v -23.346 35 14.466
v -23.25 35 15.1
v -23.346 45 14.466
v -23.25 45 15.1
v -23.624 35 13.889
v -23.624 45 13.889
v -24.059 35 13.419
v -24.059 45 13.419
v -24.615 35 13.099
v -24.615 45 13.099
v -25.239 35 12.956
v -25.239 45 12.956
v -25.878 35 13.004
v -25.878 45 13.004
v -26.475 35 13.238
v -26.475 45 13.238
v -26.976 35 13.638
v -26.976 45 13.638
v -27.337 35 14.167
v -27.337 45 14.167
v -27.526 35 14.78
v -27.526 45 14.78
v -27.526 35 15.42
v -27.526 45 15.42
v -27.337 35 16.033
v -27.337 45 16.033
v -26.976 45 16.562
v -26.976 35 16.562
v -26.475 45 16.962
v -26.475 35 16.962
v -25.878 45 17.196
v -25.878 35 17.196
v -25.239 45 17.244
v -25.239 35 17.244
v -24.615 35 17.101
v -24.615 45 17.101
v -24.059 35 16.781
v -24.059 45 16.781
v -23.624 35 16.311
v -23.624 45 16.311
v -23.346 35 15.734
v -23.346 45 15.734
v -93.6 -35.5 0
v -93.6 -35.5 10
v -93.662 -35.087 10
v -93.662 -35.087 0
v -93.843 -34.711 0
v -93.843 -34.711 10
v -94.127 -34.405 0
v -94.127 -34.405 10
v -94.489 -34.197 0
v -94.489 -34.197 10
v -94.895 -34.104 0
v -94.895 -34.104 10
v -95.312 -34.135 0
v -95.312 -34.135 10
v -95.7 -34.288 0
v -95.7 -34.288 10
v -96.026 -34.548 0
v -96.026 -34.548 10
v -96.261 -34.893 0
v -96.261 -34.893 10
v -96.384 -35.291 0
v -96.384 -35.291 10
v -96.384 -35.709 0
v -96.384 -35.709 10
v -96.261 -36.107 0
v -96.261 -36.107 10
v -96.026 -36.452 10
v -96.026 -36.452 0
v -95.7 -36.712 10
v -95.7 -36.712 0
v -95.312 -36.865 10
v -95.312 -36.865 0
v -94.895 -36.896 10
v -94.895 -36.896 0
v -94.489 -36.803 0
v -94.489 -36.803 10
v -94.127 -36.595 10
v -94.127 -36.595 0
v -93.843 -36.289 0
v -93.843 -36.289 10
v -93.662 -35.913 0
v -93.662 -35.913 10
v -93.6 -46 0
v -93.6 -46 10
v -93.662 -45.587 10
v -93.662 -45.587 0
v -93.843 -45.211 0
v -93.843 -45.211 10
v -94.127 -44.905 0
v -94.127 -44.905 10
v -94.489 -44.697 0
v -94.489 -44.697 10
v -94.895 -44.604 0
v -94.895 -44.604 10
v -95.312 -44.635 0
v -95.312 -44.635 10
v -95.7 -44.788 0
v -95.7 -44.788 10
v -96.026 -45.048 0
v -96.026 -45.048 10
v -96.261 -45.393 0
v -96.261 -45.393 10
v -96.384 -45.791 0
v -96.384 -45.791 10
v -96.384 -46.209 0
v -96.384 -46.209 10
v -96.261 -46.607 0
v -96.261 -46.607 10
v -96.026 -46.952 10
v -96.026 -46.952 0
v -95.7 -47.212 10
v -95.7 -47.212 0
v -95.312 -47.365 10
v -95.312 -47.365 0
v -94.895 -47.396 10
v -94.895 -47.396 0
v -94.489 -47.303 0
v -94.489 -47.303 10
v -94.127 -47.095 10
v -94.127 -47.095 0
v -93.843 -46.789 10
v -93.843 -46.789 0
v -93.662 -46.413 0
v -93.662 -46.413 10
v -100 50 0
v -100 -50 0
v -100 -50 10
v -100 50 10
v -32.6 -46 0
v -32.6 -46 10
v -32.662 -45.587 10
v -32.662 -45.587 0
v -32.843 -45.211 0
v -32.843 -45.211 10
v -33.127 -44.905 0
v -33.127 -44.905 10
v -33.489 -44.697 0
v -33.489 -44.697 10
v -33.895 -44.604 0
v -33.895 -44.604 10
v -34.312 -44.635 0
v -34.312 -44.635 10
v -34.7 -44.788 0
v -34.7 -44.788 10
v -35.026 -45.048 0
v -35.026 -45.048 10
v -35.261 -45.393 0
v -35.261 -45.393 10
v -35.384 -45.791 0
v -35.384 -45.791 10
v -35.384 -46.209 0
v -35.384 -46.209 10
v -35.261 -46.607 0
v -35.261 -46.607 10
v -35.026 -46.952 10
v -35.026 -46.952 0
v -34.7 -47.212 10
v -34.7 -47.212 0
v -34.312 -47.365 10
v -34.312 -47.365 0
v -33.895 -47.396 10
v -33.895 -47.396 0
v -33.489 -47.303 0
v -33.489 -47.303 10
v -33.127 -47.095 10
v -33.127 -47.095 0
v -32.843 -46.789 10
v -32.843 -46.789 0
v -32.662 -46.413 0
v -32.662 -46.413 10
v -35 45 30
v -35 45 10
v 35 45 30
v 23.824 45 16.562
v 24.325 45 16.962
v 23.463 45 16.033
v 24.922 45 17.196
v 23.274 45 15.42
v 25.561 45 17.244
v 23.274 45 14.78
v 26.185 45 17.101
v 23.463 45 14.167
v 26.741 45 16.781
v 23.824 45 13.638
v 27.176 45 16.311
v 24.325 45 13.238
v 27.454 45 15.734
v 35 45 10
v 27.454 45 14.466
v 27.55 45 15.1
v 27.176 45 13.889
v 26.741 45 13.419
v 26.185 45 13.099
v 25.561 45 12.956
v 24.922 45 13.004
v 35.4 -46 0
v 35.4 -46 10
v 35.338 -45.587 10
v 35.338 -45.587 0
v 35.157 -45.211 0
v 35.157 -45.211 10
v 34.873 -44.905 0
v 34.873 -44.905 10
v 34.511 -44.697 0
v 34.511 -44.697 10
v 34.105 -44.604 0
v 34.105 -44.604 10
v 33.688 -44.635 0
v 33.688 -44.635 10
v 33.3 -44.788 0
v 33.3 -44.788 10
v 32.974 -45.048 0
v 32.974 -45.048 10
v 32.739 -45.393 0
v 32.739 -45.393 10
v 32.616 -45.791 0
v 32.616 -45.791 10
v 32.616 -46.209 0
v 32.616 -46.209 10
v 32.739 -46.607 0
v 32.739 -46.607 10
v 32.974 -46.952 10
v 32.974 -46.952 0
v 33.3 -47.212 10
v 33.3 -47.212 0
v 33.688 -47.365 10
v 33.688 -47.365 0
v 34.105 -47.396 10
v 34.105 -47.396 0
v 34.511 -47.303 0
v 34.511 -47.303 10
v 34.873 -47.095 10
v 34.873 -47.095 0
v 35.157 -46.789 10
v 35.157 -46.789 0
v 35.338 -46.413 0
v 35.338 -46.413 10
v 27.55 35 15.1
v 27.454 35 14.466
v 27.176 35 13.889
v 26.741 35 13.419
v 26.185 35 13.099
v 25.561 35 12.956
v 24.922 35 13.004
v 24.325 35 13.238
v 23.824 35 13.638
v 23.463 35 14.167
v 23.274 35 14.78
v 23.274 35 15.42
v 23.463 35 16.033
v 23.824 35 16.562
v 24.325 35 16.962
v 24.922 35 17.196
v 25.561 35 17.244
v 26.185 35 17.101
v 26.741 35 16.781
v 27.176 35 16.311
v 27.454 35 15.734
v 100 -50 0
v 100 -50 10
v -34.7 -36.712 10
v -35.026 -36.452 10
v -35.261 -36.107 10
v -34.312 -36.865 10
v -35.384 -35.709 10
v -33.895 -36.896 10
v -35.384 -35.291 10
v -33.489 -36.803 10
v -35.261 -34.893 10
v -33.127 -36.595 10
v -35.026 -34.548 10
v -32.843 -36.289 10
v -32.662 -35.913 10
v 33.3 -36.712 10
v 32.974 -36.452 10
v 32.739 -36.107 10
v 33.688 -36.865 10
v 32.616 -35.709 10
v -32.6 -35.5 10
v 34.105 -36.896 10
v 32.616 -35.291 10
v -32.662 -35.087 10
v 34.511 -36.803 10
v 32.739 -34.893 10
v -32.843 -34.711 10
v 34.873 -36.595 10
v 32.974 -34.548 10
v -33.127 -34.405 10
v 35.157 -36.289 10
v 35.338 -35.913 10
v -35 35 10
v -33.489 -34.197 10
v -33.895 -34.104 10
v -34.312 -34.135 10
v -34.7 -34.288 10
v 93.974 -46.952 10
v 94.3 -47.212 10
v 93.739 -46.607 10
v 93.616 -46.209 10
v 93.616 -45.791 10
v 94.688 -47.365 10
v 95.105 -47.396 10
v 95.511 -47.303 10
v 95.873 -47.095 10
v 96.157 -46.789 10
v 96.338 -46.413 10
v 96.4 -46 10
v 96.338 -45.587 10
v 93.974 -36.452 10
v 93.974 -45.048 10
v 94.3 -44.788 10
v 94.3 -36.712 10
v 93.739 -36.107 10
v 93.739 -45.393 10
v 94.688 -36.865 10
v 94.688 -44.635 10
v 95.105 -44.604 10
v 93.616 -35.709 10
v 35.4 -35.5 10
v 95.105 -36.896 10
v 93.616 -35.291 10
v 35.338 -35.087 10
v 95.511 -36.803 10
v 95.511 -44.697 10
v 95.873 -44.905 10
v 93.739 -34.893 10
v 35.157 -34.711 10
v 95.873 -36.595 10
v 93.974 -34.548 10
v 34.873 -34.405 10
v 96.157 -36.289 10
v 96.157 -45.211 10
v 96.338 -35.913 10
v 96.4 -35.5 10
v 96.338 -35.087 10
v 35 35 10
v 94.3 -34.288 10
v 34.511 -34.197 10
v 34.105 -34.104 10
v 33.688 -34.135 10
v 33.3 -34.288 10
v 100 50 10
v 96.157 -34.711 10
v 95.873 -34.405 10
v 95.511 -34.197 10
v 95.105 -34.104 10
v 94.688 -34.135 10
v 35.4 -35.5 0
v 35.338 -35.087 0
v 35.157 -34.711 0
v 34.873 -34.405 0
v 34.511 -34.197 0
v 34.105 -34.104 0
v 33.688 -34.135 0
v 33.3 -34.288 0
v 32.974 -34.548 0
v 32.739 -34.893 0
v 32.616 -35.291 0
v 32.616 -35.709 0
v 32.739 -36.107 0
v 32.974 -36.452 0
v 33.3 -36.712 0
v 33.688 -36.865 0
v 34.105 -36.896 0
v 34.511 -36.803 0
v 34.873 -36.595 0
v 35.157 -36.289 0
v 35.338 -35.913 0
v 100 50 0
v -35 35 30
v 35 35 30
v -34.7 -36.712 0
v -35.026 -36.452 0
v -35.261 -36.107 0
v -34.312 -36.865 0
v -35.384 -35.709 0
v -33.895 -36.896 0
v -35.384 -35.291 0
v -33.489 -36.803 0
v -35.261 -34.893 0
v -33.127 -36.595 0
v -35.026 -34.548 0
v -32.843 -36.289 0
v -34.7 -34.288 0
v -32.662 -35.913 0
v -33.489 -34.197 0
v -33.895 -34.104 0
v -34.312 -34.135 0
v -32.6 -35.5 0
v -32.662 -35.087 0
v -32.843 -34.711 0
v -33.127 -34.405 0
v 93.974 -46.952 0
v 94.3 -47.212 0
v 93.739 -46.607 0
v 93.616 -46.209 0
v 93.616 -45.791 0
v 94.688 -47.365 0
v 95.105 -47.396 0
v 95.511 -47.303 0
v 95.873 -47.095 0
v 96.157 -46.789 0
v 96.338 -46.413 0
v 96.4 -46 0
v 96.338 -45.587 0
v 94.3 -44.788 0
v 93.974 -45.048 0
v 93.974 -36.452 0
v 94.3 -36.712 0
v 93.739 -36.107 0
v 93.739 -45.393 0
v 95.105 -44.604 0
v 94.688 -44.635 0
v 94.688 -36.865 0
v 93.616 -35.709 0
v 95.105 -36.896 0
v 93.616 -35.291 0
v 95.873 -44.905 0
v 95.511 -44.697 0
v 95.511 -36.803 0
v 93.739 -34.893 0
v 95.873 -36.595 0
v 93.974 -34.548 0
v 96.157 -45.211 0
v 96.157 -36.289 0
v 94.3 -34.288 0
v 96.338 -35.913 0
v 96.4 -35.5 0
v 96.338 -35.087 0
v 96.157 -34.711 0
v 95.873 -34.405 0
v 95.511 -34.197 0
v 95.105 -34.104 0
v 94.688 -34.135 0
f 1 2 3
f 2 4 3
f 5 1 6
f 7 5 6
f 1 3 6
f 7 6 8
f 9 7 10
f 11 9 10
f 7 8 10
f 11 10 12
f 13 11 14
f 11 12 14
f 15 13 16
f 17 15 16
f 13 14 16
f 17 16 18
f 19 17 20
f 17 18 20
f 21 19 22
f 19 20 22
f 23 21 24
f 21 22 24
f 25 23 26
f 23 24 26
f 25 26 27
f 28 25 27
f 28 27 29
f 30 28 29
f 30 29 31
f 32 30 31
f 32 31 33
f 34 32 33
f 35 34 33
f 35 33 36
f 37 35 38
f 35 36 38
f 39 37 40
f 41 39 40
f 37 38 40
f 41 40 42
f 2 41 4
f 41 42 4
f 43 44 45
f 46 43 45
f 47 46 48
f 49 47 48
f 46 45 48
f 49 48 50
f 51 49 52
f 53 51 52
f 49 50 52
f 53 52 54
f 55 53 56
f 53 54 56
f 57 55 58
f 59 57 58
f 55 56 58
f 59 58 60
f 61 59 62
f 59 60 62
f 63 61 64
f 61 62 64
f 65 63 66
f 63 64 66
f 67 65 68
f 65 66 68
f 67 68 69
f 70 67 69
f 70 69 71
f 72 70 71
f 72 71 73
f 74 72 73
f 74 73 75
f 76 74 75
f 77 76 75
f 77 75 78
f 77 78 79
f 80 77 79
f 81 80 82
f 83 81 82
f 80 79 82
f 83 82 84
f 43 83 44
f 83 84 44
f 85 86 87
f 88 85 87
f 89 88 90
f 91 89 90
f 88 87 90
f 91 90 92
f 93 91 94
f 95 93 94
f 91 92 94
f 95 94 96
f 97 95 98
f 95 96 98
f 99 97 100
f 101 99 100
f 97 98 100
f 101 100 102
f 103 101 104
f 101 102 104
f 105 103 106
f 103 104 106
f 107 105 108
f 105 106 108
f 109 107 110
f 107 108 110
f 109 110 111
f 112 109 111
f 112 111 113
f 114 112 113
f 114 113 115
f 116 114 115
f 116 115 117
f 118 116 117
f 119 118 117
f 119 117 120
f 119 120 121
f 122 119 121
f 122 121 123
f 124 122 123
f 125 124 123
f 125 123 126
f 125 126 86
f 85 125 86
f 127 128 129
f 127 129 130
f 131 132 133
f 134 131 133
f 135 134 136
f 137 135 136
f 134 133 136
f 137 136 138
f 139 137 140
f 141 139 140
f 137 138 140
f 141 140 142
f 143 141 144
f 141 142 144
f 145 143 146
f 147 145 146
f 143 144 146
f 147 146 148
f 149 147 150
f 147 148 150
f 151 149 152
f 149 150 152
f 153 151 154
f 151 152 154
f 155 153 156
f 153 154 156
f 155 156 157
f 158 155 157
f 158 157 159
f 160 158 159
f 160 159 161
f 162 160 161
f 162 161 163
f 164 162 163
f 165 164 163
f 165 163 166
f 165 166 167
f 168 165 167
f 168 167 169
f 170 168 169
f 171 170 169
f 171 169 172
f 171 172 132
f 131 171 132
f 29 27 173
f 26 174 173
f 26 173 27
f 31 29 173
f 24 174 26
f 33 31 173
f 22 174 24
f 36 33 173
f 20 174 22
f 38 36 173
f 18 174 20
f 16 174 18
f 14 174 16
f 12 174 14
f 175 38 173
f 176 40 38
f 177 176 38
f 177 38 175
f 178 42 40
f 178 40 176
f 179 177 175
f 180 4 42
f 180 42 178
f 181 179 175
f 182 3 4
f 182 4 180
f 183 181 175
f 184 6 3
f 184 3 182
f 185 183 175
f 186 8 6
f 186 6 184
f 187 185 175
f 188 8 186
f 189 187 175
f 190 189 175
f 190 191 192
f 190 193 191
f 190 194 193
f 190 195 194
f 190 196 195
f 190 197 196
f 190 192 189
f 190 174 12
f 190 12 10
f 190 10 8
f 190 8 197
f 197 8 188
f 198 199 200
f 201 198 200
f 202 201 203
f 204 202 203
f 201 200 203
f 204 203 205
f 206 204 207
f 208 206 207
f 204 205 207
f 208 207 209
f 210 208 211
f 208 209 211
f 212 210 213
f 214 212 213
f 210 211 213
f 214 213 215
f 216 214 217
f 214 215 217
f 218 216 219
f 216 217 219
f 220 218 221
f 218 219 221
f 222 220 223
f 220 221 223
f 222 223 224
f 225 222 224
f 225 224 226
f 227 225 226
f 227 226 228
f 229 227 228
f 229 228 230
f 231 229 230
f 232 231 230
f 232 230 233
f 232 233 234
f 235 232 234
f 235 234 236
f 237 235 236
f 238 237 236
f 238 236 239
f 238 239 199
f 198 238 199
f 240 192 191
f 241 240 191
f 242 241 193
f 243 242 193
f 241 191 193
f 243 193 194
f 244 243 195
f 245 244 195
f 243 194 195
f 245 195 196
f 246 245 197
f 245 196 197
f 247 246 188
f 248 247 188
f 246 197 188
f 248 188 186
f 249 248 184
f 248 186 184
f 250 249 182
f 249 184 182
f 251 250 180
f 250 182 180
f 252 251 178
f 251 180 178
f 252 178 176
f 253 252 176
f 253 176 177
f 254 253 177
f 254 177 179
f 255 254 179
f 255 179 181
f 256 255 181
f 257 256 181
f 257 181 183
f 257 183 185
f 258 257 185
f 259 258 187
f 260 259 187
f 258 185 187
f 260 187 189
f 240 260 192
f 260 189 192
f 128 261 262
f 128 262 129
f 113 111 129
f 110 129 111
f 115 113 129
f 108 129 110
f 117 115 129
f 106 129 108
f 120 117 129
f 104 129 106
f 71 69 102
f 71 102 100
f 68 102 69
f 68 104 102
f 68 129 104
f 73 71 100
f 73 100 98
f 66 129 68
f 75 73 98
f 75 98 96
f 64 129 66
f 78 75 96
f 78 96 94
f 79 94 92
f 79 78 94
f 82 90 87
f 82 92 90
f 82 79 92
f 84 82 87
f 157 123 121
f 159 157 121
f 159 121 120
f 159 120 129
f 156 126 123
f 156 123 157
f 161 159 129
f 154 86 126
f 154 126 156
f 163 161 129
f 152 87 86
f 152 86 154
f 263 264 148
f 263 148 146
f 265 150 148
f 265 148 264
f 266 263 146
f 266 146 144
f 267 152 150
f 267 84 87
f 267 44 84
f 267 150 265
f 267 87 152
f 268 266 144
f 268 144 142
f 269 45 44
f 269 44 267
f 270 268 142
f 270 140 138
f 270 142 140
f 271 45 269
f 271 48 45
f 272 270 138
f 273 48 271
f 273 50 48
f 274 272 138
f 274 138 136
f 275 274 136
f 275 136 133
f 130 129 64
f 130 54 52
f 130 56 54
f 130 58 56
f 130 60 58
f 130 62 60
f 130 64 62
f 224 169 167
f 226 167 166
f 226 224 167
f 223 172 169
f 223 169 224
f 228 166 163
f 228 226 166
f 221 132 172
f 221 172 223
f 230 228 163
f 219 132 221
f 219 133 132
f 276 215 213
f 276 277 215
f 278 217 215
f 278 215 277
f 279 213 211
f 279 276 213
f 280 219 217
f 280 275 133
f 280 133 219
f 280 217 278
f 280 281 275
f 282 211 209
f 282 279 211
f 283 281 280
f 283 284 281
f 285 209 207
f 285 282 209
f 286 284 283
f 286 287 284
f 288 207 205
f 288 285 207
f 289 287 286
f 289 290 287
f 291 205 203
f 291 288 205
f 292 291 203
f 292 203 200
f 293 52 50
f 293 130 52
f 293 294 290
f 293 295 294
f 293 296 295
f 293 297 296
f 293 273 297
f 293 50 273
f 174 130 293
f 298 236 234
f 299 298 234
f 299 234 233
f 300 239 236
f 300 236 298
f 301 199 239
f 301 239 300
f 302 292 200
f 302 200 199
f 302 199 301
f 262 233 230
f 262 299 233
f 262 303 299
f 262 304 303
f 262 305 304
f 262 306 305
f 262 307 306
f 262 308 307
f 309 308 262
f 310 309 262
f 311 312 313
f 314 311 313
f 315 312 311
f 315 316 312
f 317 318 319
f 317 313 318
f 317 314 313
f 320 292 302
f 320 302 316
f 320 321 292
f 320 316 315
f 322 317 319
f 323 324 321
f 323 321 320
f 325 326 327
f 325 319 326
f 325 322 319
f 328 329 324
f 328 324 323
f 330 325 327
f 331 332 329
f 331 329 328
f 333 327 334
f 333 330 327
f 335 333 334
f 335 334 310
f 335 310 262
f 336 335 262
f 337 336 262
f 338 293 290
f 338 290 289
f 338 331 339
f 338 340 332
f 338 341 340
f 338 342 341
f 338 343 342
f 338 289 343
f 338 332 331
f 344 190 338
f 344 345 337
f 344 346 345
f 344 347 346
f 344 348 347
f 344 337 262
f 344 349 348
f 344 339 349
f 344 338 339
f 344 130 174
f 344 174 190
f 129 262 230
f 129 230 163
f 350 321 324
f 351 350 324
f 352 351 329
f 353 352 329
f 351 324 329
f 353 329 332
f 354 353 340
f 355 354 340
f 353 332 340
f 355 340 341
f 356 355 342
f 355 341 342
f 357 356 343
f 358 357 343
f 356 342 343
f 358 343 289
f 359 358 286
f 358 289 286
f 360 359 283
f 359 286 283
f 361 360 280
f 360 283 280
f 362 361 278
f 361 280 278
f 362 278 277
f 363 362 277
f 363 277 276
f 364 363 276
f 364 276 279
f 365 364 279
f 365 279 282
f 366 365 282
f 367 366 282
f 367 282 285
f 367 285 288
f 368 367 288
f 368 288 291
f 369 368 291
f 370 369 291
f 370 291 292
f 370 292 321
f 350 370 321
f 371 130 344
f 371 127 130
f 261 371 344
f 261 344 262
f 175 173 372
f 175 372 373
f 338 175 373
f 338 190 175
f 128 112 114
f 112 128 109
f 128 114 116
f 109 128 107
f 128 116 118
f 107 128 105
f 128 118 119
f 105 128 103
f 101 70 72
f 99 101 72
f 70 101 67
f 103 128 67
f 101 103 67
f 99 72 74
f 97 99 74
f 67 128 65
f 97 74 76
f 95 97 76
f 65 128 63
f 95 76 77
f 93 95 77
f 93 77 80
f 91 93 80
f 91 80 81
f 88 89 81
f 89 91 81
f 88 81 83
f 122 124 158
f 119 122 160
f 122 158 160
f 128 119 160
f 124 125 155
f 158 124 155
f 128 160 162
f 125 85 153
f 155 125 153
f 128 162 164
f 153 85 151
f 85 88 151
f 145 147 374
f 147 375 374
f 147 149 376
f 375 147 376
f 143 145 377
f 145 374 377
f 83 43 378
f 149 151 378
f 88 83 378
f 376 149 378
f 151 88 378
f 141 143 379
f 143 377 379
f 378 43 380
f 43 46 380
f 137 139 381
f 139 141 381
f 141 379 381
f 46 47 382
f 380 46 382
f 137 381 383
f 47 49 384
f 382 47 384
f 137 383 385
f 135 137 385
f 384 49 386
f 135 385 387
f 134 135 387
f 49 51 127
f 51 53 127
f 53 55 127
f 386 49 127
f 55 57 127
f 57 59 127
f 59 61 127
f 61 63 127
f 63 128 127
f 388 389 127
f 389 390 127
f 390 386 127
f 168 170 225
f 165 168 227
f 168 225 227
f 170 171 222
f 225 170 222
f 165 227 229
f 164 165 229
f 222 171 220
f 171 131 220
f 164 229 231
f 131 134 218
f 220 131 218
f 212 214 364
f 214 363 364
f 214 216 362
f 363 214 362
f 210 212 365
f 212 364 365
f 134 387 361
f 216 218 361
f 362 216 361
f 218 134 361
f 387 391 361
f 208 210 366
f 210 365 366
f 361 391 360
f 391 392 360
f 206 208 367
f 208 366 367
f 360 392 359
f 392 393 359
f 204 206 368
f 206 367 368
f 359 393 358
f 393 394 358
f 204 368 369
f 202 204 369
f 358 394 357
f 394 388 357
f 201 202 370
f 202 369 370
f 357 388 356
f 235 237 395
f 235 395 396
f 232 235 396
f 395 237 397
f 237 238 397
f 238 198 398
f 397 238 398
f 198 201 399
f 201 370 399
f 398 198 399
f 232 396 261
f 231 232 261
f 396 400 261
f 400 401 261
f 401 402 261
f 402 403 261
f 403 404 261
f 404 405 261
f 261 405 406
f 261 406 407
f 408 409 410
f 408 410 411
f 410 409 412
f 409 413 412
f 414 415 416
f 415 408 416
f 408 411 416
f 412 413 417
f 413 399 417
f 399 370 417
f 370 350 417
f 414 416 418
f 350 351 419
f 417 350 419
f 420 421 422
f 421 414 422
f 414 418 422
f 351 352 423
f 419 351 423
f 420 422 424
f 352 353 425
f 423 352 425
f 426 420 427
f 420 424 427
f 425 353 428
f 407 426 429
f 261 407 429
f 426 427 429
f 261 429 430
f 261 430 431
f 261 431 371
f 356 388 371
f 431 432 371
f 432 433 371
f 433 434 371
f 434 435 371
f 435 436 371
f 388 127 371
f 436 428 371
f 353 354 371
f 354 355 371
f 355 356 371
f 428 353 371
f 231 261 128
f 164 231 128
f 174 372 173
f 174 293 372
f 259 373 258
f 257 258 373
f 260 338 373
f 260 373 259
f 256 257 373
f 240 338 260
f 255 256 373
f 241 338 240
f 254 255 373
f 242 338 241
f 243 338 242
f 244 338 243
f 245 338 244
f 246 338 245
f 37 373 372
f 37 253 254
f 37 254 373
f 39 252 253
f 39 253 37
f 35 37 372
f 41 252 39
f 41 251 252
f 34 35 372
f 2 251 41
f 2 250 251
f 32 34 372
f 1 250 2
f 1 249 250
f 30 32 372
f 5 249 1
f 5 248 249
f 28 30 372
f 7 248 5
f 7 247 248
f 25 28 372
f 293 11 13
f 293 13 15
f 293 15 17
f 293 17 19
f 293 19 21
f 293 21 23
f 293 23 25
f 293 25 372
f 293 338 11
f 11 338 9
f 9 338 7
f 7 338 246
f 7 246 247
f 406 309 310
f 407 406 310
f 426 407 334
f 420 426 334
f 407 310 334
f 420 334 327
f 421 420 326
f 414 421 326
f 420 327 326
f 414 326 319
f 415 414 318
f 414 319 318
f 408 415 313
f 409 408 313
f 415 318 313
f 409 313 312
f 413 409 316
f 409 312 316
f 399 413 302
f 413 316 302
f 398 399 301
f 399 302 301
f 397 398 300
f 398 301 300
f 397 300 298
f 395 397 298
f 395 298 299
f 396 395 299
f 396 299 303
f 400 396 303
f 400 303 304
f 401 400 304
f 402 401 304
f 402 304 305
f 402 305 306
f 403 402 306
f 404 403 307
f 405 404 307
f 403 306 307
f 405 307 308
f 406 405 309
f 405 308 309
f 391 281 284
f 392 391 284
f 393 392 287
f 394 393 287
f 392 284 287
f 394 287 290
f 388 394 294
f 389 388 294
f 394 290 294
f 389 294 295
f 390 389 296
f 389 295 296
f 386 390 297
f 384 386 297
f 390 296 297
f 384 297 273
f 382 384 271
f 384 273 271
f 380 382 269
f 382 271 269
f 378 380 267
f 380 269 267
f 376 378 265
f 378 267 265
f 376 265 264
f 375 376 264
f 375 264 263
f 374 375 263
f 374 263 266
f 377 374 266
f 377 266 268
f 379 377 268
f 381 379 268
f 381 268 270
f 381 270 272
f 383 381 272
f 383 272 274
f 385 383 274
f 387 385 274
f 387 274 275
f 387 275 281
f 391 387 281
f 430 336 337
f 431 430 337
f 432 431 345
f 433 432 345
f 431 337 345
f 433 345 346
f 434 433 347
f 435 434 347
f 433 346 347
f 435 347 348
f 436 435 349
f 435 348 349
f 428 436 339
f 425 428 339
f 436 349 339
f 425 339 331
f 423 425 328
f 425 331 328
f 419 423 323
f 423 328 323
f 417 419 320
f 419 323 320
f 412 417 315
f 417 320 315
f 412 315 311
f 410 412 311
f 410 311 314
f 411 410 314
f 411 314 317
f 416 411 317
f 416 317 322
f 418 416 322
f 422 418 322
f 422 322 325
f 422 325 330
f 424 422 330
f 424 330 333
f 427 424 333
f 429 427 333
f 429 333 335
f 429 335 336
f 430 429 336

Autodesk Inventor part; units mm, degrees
ref_plane "YZ Plane" through (0, 0, 0) normal (1, 0, 0) x (0, 1, 0)
ref_plane "XZ Plane" through (0, 0, 0) normal (0, 1, 0) x (-1, 0, 0)
ref_plane "XY Plane" through (0, 0, 0) normal (0, 0, 1) x (1, 0, 0)
sketch "Sketch1" plane through (0, 0, 0) normal (0, 0, 1) x (1, 0, 0)
  line L0 (-100, 50) -> (100, 50)
  line L1 (100, 50) -> (100, -50)
  line L2 (100, -50) -> (-100, -50)
  line L3 (-100, -50) -> (-100, 50)
  point P0 (0, 0)
  point P1 (100, 0)
  point P2 (0, 50)
  dimension "d0" = 200
  dimension "d1" = 100
extrude "Extrusion1" add sketch "Sketch1" along normal blind 10
sketch "Sketch2" plane through (0, 0, 10) normal (0, 0, 1) x (1, 0, 0)
  line L0 (30.48, -9.53) -> (-30.48, -9.53)
  line L1 (-30.48, -9.53) -> (-30.48, 40)
  line L2 (-30.48, 40) -> (30.48, 40)
  line L3 (30.48, 40) -> (30.48, -9.53)
  circle A0 centre (25.4, 34.92) radius 2.15
  line L4 (100, 50) -> (-100, 50) projected
  circle A1 centre (25.4, -4.45) radius 2.15
  circle A2 centre (-25.4, -4.45) radius 2.15
  circle A3 centre (-25.4, 34.92) radius 2.15
  point P0 (0, 0)
  point P1 (0, -9.53)
  dimension "d4" = 60.96
  dimension "d5" = 49.53
  dimension "d6" = 4.3
  dimension "d7" = 5.08
  dimension "d8" = 5.08
  dimension "d9" = 10
  dimension "d10" = 5.08
  dimension "d11" = 5.08
  dimension "d12" = 4.3
  dimension "d13" = 4.3
  dimension "d14" = 5.08
  dimension "d15" = 5.08
  dimension "d16" = 5.08
  dimension "d17" = 5.08
  dimension "d18" = 4.3
extrude "Extrusion2" [suppressed]
sketch "Sketch3" plane through (0, 0, 10) normal (0, 0, 1) x (1, 0, 0)
  line L0 (98, -48) -> (28, -48)
  line L1 (28, -48) -> (28, -23)
  line L2 (28, -23) -> (98, -23)
  line L3 (98, -23) -> (98, -48)
  line L4 (-100, -50) -> (100, -50) projected
  line L5 (-100, 50) -> (-100, -50) projected
  line L6 (100, -50) -> (100, 50) projected
  circle A0 centre (95, -46) radius 1.4
  circle A1 centre (95, -35.5) radius 1.4
  circle A2 centre (34, -46) radius 1.4
  circle A3 centre (34, -35.5) radius 1.4
  line L7 (0, 0) -> (0, -50) construction
  circle A4 centre (-95, -46) radius 1.4
  circle A5 centre (-95, -35.5) radius 1.4
  circle A6 centre (-34, -46) radius 1.4
  circle A7 centre (-34, -35.5) radius 1.4
  dimension "d21" = 70
  dimension "d22" = 25
  dimension "d25" = 2
  dimension "d27" = 2
  dimension "d28" = 2.8
  dimension "d31" = 2.8
  dimension "d38" = 2.8
  dimension "d39" = 2.8
  dimension "d42" = 10.5
  dimension "d43" = 10.5
  dimension "d44" = 61
  dimension "d45" = 3
  dimension "d49" = 4
extrude "Extrusion4" cut sketch "Sketch3" against normal up to surface (10 mm away) contours A0 | A1 | A2 | A3 | A4 | A5 | A6 | A7
sketch "Sketch4" plane through (0, 0, 10) normal (0, 0, 1) x (1, 0, 0)
  line L0 (35, 35) -> (-35, 35)
  line L1 (-35, 35) -> (-35, 45)
  line L2 (-35, 45) -> (35, 45)
  line L3 (35, 45) -> (35, 35)
  line L4 (-100, -50) -> (100, -50) projected
  point P0 (0, 0)
  point P1 (0, 35)
  dimension "d50" = 85
  dimension "d51" = 10
  dimension "d52" = 70
extrude "Extrusion5" add sketch "Sketch4" along normal blind 20
sketch "Sketch5" plane through (-100, 50, 0) normal (0, 1, 0) x (1, 0, 0)
  line L0 (130.48, -30.7809) -> (69.52, -30.7809)
  line L1 (69.52, -30.7809) -> (69.52, -15.7809)
  line L2 (69.52, -15.7809) -> (130.48, -15.7809)
  line L3 (130.48, -15.7809) -> (130.48, -30.7809)
  line L4 (0, 0) -> (200, 0) projected
  circle A0 centre (125.4, -15.1) radius 2.15
  circle A1 centre (74.6, -15.1) radius 2.15
  line L5 (200, -10) -> (135, -10) projected
  line L6 (65, -10) -> (0, -10) projected
  point P0 (100, 0)
  point P1 (100, 0)
  point P2 (100, -30.7809)
  dimension "d55" = 60.96
  dimension "d56" = 15
  dimension "d57" = 4.3
  dimension "d58" = 4.3
  dimension "d59" = 5.1
  dimension "d60" = 5.1
  dimension "d61" = 5.08
  dimension "d62" = 5.08
extrude "Extrusion6" cut sketch "Sketch5" against normal up to surface (15 mm away) contours A0 L2 | L2 A0 | A1 L2 | L2 A1
properties part number "motor holder"
